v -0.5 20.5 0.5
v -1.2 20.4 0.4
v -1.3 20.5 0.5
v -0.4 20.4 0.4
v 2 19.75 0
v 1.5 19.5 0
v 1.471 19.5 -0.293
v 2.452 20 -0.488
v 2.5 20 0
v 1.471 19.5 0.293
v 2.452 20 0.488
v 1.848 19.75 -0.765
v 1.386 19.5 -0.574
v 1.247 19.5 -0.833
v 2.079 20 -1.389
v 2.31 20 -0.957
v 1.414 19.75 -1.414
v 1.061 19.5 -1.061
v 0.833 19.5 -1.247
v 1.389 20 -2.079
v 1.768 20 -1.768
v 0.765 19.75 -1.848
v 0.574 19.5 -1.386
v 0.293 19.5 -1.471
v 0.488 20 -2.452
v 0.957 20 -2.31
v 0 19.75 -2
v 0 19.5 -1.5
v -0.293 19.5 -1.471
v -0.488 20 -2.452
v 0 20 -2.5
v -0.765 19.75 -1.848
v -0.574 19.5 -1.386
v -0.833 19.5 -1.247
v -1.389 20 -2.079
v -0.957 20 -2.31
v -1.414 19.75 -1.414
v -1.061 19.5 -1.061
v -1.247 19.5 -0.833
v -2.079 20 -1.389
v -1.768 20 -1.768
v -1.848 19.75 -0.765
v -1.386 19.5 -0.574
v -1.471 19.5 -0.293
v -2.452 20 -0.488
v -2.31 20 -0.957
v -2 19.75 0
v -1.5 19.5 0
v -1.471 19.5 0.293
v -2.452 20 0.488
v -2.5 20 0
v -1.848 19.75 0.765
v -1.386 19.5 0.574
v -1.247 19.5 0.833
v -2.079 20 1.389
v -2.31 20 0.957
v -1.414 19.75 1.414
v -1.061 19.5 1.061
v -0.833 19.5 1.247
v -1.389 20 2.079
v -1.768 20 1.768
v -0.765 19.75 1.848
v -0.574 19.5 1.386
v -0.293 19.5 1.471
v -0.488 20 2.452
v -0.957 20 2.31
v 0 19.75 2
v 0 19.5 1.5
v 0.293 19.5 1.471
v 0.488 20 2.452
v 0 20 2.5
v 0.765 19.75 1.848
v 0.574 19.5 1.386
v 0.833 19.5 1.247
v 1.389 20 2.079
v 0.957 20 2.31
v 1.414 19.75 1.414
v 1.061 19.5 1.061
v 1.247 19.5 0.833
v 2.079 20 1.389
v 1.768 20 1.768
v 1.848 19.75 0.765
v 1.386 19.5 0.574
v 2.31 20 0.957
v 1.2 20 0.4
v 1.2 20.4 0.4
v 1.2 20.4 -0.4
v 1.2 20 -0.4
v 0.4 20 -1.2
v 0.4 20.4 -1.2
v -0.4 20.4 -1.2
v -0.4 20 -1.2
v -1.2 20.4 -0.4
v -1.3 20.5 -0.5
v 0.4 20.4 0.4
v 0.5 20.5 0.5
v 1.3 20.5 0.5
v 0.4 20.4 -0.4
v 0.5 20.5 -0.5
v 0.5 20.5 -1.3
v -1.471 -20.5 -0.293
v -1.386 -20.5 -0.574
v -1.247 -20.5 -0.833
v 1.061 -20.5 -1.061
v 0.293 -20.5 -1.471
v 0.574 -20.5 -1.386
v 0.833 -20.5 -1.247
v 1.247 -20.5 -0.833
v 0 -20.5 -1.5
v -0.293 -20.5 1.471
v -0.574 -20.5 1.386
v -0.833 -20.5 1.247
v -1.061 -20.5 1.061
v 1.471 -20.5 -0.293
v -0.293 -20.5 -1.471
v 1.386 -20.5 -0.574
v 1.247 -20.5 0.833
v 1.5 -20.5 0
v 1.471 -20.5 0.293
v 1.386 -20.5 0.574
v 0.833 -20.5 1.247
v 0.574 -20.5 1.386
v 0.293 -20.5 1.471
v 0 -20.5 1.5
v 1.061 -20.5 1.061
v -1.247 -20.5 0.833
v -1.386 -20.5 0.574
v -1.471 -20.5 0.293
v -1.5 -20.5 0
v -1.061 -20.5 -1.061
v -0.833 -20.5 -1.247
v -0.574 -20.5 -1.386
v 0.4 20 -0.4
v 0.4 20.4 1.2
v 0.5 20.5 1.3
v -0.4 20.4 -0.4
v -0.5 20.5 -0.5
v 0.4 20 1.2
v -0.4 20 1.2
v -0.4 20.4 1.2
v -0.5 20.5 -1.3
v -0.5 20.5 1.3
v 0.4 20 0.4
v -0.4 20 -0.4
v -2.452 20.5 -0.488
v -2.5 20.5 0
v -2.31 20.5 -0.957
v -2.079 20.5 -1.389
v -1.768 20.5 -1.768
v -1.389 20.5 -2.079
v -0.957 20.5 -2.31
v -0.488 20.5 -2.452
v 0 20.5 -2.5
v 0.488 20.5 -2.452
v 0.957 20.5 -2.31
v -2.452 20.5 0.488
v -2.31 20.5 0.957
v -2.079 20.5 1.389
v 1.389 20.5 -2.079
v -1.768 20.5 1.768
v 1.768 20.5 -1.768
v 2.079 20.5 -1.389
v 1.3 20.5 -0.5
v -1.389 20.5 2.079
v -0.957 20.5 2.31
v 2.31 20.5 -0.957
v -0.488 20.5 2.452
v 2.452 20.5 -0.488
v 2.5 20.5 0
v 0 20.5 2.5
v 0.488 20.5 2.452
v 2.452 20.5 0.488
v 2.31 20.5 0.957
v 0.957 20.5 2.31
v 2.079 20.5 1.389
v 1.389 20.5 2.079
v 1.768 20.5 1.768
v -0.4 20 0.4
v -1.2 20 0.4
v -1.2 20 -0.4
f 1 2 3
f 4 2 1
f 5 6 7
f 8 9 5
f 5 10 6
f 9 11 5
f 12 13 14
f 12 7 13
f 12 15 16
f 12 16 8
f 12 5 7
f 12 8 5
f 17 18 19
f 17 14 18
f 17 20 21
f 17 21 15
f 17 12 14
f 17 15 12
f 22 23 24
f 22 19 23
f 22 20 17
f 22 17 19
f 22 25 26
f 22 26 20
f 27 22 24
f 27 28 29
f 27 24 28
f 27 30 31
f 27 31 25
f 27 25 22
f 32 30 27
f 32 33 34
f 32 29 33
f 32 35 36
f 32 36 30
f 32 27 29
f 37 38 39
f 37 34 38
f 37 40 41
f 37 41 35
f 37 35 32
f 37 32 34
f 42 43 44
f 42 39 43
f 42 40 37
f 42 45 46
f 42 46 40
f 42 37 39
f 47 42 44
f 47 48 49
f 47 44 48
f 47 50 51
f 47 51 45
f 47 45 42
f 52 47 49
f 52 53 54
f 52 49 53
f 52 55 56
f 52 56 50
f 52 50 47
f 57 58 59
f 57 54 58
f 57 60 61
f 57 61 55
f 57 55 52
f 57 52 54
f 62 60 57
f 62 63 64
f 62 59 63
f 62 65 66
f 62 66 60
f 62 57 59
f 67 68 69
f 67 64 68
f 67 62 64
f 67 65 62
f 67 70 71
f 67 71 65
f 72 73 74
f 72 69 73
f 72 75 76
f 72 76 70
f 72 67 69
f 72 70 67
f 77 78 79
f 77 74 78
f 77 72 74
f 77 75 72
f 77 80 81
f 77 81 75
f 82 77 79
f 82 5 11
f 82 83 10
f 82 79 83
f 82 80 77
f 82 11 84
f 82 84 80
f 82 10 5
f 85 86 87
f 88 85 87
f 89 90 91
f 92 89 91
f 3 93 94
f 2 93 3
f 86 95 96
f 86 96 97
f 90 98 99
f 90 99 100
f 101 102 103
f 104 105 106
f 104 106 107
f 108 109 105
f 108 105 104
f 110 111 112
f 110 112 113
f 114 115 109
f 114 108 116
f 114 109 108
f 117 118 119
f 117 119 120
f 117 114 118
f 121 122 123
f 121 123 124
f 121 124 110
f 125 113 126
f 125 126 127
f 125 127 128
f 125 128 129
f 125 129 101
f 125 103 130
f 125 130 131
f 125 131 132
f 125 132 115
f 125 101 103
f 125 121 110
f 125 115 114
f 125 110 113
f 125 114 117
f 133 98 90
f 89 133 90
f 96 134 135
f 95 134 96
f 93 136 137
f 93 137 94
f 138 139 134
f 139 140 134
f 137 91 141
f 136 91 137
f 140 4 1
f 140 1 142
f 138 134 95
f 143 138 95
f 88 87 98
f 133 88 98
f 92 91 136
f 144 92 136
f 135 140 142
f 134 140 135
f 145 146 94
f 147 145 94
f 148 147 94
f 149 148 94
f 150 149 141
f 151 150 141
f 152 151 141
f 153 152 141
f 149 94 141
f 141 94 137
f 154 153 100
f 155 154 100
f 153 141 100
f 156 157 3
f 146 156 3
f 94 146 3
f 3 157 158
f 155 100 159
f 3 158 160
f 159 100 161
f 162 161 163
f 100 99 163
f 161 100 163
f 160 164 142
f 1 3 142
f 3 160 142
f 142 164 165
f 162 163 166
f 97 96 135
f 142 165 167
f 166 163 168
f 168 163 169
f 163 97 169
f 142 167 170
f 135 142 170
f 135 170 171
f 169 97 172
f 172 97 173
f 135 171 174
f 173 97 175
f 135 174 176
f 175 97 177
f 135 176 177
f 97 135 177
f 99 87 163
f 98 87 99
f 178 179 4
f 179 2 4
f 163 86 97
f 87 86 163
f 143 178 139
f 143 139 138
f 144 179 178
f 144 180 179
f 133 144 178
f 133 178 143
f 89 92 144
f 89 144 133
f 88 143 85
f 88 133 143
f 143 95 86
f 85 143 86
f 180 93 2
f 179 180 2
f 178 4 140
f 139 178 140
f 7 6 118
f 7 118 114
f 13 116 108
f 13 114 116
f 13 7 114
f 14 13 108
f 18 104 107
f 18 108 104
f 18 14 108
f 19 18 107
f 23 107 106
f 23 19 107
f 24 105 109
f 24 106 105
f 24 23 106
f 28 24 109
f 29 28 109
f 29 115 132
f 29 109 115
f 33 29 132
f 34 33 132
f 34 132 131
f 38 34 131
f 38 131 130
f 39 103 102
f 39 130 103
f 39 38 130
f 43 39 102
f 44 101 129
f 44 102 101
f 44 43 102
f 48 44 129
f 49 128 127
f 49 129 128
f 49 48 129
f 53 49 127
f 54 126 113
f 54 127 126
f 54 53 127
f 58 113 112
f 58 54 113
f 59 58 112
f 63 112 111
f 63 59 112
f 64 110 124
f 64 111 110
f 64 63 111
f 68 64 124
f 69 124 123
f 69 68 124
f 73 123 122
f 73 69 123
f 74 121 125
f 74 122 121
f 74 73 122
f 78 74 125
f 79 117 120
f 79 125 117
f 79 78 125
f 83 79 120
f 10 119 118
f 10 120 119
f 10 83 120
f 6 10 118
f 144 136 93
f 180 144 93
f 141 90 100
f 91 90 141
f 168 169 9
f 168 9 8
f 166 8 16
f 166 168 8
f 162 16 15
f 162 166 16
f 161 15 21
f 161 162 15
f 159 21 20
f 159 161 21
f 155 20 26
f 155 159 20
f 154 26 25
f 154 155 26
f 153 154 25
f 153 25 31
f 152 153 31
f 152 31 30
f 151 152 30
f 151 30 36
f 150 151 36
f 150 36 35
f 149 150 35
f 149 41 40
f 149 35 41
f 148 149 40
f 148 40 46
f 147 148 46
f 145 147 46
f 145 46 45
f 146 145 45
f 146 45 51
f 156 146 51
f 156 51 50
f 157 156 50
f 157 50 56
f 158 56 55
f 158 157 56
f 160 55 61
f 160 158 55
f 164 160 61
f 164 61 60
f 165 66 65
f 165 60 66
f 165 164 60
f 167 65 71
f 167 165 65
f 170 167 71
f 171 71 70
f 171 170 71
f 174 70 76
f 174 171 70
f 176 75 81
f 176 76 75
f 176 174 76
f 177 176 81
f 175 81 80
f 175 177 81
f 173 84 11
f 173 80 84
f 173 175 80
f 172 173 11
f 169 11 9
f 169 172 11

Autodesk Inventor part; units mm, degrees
ref_plane "YZ Plane" through (0, 0, 0) normal (1, 0, 0) x (0, 1, 0)
ref_plane "XZ Plane" through (0, 0, 0) normal (0, 1, 0) x (-1, 0, 0)
ref_plane "XY Plane" through (0, 0, 0) normal (0, 0, 1) x (1, 0, 0)
sketch "Sketch1" plane through (0, 0, 0) normal (0, 0, 1) x (1, 0, 0)
  line L0 (0, -20.5) -> (1.5, -20.5)
  line L1 (1.5, -20.5) -> (1.5, 19.5)
  line L2 (2.5, 20.5) -> (0, 20.5)
  line L3 (0, 20.5) -> (0, -20.5)
  line L4 (1.5, 19.5) -> (2.5, 20)
  line L5 (2.5, 20) -> (2.5, 20.5)
  point P0 (0, 0)
  point P1 (0, 0)
  dimension "d0" = 1.5
  dimension "d1" = 41
  dimension "d2" = 2.5
  dimension "d3" = 40
  dimension "d15" = 0.5
revolve "Revolution1" add sketch "Sketch1" angle 360 about axis through (0, 20.5, 0) along (0, -1, 0)
sketch "Sketch2" plane through (0, 20.5, 0) normal (0, 1, 0) x (1, 0, 0)
  line L0 (0, 1.2) -> (-0.4, 1.2)
  circle A0 centre (0, 0) radius 1.5 projected
  line L1 (-1.2, 0.4) -> (-1.2, 0)
  line L2 (-0.4, 1.2) -> (-0.4, 0.4)
  line L3 (-0.4, 0.4) -> (-1.2, 0.4)
  line L4 (-1.2, 0) -> (-1.2, -0.4)
  line L5 (-1.2, -0.4) -> (-0.4, -0.4)
  line L6 (-0.4, -0.4) -> (-0.4, -1.2)
  line L7 (-0.4, -1.2) -> (0, -1.2)
  line L8 (0, -1.2) -> (0.4, -1.2)
  line L9 (0.4, -1.2) -> (0.4, -0.4)
  line L10 (0.4, -0.4) -> (1.2, -0.4)
  line L11 (1.2, -0.4) -> (1.2, 0)
  line L12 (1.2, 0) -> (1.2, 0.4)
  line L13 (1.2, 0.4) -> (0.4, 0.4)
  line L14 (0.4, 0.4) -> (0.4, 1.2)
  line L15 (0.4, 1.2) -> (0, 1.2)
  line L16 (-1.2, -0.4) -> (-1.2, 0.4)
  line L17 (-0.4, 1.2) -> (0.4, 1.2)
  line L18 (1.2, -0.4) -> (1.2, 0.4)
  line L19 (0.4, -1.2) -> (-0.4, -1.2)
  point P0 (0, 0)
  dimension "d5" = 1.2
  dimension "d6" = 1.2
  dimension "d8" = 0.4
  dimension "d11" = 360
extrude "Extrusion1" cut sketch "Sketch2" against normal blind 0.5 contours L15 L14 L13 L12 L11 L10 L9 L8 L7 L6 L5 L4 L1 L3 L2 L0
thread "Thread1" size "M3x0.5" class "6g" standard "ANSI Metric M Profile" full length
chamfer "Chamfer1" distance 0.1 angle 45 12 edges at (-0.8, 20.5, -0.4) (-0.4, 20.5, -0.8) (0, 20.5, -1.2) (0.4, 20.5, -0.8) (0.8, 20.5, -0.4) (1.2, 20.5, 0) (0.8, 20.5, 0.4) (0.4, 20.5, 0.8) (0, 20.5, 1.2) (-0.4, 20.5, 0.8) (-1.2, 20.5, 0) (-0.8, 20.5, 0.4)
equation "\"d6\" = d5"
properties part number "M3x40mm"
